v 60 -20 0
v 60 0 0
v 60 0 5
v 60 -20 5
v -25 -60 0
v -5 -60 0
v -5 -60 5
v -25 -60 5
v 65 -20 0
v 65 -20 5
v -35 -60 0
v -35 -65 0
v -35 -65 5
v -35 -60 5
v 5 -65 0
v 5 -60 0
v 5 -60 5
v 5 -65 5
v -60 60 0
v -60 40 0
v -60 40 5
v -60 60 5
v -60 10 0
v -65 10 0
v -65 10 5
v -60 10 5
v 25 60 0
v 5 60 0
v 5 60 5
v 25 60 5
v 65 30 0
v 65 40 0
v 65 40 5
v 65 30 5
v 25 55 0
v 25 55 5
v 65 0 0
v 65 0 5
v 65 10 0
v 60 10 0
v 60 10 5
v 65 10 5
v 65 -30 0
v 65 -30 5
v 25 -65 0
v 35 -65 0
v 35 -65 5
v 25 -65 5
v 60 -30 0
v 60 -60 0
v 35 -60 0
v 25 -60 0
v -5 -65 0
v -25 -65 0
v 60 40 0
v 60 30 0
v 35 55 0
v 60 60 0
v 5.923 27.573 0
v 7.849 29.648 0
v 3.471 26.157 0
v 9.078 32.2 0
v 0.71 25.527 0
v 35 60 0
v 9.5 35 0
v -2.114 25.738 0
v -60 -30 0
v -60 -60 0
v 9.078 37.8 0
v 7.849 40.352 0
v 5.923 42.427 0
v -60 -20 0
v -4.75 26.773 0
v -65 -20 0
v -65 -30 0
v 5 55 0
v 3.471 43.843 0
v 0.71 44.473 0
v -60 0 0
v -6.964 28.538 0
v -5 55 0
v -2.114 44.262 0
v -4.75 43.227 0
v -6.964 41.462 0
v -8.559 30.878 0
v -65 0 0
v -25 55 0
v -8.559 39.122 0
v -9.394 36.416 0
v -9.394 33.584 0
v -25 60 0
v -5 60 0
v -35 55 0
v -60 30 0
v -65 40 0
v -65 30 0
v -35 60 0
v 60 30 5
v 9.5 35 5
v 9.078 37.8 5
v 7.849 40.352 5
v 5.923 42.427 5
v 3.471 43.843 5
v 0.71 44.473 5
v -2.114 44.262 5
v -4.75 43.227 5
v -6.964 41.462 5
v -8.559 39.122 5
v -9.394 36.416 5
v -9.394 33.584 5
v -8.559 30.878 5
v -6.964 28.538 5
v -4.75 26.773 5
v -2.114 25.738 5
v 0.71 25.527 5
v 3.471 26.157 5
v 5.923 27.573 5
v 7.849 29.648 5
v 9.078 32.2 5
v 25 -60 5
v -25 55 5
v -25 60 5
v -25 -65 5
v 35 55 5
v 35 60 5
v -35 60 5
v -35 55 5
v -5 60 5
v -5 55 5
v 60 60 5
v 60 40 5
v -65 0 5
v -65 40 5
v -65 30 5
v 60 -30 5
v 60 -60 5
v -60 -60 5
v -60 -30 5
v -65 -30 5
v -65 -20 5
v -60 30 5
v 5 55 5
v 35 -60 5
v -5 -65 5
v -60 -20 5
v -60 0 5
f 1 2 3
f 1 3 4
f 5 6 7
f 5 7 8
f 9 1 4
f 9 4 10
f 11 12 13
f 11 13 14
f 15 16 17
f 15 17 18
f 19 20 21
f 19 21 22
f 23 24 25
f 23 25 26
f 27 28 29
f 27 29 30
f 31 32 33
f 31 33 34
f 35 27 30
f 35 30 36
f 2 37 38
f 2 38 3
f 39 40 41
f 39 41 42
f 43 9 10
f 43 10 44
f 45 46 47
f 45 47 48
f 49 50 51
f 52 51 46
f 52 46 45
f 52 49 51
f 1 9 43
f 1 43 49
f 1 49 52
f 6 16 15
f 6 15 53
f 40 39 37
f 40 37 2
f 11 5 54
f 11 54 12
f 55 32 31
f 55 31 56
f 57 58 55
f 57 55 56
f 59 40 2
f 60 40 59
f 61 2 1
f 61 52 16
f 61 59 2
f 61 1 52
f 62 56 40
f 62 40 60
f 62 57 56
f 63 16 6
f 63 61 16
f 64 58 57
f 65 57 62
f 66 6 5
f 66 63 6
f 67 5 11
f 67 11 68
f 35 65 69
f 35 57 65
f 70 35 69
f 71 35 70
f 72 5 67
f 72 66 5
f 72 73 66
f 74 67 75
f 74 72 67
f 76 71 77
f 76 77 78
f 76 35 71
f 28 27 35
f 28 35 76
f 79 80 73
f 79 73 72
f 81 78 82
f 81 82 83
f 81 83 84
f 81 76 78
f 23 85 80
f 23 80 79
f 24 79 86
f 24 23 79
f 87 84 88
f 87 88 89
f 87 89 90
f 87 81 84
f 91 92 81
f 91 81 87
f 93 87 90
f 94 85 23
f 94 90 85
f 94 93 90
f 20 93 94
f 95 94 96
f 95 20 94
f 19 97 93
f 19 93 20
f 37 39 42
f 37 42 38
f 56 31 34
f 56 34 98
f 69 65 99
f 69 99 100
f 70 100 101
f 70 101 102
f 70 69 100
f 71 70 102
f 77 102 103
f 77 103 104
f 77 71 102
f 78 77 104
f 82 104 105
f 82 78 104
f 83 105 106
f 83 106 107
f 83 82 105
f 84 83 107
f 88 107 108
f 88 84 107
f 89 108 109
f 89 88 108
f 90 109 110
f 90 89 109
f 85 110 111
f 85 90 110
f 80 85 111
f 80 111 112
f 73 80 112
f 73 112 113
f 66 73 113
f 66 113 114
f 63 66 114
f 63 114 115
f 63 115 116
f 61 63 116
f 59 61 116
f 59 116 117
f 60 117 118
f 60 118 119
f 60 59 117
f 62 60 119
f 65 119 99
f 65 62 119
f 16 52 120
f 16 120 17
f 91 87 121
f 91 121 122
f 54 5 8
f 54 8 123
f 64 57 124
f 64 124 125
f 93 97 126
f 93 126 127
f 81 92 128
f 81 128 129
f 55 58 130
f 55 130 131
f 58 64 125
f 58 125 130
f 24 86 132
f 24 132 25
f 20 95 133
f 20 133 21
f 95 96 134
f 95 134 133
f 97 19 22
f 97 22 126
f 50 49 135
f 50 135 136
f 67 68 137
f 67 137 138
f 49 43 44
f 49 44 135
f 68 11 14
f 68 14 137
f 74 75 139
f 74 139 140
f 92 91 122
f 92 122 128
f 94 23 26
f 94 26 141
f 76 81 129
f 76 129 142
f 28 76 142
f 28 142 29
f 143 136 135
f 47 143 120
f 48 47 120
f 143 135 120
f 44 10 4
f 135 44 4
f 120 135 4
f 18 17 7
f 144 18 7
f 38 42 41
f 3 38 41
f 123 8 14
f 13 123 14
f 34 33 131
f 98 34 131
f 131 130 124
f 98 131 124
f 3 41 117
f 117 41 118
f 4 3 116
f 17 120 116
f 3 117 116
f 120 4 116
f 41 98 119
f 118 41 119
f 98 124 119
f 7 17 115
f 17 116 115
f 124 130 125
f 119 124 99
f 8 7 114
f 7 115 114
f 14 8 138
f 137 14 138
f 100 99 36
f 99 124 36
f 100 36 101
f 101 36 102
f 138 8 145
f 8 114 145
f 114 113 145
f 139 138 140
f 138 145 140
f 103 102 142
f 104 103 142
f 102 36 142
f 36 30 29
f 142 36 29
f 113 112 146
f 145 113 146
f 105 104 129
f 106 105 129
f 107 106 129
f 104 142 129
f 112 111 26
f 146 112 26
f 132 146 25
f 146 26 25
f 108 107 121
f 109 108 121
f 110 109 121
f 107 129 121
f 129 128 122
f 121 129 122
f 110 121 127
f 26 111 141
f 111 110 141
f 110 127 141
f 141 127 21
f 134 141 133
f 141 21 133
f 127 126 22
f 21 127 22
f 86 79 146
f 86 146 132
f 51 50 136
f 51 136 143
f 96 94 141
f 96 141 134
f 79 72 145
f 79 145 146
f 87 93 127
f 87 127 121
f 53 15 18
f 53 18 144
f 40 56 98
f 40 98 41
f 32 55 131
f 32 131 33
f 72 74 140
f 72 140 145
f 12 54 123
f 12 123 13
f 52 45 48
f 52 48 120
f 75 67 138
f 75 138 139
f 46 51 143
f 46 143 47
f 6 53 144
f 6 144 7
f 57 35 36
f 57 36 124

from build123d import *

# Parameters (mm, degrees)
SKETCH1_R           = 9.5
BOSS_EXTRUDE1_DEPTH = 5


with BuildPart() as part:
    # Sketch1 → Boss-Extrude1 (new body)
    with BuildSketch(Plane.XY):
        Polygon((-35, 60), (-35, 55), (-25, 55), (-25, 60), (-5, 60), (-5, 55), (5, 55), (5, 60), (25, 60), (25, 55), (35, 55), (35, 60), (60, 60), (60, 40), (65, 40), (65, 30), (60, 30), (60, 10), (65, 10), (65, 0), (60, 0), (60, -20), (65, -20), (65, -30), (60, -30), (60, -60), (35, -60), (35, -65), (25, -65), (25, -60), (5, -60), (5, -65), (-5, -65), (-5, -60), (-25, -60), (-25, -65), (-35, -65), (-35, -60), (-60, -60), (-60, -30), (-65, -30), (-65, -20), (-60, -20), (-60, 0), (-65, 0), (-65, 10), (-60, 10), (-60, 30), (-65, 30), (-65, 40), (-60, 40), (-60, 60), align=None)
        with Locations((0, 35)):
            Circle(SKETCH1_R, mode=Mode.SUBTRACT)
    extrude(amount=BOSS_EXTRUDE1_DEPTH)


solid = part.part
